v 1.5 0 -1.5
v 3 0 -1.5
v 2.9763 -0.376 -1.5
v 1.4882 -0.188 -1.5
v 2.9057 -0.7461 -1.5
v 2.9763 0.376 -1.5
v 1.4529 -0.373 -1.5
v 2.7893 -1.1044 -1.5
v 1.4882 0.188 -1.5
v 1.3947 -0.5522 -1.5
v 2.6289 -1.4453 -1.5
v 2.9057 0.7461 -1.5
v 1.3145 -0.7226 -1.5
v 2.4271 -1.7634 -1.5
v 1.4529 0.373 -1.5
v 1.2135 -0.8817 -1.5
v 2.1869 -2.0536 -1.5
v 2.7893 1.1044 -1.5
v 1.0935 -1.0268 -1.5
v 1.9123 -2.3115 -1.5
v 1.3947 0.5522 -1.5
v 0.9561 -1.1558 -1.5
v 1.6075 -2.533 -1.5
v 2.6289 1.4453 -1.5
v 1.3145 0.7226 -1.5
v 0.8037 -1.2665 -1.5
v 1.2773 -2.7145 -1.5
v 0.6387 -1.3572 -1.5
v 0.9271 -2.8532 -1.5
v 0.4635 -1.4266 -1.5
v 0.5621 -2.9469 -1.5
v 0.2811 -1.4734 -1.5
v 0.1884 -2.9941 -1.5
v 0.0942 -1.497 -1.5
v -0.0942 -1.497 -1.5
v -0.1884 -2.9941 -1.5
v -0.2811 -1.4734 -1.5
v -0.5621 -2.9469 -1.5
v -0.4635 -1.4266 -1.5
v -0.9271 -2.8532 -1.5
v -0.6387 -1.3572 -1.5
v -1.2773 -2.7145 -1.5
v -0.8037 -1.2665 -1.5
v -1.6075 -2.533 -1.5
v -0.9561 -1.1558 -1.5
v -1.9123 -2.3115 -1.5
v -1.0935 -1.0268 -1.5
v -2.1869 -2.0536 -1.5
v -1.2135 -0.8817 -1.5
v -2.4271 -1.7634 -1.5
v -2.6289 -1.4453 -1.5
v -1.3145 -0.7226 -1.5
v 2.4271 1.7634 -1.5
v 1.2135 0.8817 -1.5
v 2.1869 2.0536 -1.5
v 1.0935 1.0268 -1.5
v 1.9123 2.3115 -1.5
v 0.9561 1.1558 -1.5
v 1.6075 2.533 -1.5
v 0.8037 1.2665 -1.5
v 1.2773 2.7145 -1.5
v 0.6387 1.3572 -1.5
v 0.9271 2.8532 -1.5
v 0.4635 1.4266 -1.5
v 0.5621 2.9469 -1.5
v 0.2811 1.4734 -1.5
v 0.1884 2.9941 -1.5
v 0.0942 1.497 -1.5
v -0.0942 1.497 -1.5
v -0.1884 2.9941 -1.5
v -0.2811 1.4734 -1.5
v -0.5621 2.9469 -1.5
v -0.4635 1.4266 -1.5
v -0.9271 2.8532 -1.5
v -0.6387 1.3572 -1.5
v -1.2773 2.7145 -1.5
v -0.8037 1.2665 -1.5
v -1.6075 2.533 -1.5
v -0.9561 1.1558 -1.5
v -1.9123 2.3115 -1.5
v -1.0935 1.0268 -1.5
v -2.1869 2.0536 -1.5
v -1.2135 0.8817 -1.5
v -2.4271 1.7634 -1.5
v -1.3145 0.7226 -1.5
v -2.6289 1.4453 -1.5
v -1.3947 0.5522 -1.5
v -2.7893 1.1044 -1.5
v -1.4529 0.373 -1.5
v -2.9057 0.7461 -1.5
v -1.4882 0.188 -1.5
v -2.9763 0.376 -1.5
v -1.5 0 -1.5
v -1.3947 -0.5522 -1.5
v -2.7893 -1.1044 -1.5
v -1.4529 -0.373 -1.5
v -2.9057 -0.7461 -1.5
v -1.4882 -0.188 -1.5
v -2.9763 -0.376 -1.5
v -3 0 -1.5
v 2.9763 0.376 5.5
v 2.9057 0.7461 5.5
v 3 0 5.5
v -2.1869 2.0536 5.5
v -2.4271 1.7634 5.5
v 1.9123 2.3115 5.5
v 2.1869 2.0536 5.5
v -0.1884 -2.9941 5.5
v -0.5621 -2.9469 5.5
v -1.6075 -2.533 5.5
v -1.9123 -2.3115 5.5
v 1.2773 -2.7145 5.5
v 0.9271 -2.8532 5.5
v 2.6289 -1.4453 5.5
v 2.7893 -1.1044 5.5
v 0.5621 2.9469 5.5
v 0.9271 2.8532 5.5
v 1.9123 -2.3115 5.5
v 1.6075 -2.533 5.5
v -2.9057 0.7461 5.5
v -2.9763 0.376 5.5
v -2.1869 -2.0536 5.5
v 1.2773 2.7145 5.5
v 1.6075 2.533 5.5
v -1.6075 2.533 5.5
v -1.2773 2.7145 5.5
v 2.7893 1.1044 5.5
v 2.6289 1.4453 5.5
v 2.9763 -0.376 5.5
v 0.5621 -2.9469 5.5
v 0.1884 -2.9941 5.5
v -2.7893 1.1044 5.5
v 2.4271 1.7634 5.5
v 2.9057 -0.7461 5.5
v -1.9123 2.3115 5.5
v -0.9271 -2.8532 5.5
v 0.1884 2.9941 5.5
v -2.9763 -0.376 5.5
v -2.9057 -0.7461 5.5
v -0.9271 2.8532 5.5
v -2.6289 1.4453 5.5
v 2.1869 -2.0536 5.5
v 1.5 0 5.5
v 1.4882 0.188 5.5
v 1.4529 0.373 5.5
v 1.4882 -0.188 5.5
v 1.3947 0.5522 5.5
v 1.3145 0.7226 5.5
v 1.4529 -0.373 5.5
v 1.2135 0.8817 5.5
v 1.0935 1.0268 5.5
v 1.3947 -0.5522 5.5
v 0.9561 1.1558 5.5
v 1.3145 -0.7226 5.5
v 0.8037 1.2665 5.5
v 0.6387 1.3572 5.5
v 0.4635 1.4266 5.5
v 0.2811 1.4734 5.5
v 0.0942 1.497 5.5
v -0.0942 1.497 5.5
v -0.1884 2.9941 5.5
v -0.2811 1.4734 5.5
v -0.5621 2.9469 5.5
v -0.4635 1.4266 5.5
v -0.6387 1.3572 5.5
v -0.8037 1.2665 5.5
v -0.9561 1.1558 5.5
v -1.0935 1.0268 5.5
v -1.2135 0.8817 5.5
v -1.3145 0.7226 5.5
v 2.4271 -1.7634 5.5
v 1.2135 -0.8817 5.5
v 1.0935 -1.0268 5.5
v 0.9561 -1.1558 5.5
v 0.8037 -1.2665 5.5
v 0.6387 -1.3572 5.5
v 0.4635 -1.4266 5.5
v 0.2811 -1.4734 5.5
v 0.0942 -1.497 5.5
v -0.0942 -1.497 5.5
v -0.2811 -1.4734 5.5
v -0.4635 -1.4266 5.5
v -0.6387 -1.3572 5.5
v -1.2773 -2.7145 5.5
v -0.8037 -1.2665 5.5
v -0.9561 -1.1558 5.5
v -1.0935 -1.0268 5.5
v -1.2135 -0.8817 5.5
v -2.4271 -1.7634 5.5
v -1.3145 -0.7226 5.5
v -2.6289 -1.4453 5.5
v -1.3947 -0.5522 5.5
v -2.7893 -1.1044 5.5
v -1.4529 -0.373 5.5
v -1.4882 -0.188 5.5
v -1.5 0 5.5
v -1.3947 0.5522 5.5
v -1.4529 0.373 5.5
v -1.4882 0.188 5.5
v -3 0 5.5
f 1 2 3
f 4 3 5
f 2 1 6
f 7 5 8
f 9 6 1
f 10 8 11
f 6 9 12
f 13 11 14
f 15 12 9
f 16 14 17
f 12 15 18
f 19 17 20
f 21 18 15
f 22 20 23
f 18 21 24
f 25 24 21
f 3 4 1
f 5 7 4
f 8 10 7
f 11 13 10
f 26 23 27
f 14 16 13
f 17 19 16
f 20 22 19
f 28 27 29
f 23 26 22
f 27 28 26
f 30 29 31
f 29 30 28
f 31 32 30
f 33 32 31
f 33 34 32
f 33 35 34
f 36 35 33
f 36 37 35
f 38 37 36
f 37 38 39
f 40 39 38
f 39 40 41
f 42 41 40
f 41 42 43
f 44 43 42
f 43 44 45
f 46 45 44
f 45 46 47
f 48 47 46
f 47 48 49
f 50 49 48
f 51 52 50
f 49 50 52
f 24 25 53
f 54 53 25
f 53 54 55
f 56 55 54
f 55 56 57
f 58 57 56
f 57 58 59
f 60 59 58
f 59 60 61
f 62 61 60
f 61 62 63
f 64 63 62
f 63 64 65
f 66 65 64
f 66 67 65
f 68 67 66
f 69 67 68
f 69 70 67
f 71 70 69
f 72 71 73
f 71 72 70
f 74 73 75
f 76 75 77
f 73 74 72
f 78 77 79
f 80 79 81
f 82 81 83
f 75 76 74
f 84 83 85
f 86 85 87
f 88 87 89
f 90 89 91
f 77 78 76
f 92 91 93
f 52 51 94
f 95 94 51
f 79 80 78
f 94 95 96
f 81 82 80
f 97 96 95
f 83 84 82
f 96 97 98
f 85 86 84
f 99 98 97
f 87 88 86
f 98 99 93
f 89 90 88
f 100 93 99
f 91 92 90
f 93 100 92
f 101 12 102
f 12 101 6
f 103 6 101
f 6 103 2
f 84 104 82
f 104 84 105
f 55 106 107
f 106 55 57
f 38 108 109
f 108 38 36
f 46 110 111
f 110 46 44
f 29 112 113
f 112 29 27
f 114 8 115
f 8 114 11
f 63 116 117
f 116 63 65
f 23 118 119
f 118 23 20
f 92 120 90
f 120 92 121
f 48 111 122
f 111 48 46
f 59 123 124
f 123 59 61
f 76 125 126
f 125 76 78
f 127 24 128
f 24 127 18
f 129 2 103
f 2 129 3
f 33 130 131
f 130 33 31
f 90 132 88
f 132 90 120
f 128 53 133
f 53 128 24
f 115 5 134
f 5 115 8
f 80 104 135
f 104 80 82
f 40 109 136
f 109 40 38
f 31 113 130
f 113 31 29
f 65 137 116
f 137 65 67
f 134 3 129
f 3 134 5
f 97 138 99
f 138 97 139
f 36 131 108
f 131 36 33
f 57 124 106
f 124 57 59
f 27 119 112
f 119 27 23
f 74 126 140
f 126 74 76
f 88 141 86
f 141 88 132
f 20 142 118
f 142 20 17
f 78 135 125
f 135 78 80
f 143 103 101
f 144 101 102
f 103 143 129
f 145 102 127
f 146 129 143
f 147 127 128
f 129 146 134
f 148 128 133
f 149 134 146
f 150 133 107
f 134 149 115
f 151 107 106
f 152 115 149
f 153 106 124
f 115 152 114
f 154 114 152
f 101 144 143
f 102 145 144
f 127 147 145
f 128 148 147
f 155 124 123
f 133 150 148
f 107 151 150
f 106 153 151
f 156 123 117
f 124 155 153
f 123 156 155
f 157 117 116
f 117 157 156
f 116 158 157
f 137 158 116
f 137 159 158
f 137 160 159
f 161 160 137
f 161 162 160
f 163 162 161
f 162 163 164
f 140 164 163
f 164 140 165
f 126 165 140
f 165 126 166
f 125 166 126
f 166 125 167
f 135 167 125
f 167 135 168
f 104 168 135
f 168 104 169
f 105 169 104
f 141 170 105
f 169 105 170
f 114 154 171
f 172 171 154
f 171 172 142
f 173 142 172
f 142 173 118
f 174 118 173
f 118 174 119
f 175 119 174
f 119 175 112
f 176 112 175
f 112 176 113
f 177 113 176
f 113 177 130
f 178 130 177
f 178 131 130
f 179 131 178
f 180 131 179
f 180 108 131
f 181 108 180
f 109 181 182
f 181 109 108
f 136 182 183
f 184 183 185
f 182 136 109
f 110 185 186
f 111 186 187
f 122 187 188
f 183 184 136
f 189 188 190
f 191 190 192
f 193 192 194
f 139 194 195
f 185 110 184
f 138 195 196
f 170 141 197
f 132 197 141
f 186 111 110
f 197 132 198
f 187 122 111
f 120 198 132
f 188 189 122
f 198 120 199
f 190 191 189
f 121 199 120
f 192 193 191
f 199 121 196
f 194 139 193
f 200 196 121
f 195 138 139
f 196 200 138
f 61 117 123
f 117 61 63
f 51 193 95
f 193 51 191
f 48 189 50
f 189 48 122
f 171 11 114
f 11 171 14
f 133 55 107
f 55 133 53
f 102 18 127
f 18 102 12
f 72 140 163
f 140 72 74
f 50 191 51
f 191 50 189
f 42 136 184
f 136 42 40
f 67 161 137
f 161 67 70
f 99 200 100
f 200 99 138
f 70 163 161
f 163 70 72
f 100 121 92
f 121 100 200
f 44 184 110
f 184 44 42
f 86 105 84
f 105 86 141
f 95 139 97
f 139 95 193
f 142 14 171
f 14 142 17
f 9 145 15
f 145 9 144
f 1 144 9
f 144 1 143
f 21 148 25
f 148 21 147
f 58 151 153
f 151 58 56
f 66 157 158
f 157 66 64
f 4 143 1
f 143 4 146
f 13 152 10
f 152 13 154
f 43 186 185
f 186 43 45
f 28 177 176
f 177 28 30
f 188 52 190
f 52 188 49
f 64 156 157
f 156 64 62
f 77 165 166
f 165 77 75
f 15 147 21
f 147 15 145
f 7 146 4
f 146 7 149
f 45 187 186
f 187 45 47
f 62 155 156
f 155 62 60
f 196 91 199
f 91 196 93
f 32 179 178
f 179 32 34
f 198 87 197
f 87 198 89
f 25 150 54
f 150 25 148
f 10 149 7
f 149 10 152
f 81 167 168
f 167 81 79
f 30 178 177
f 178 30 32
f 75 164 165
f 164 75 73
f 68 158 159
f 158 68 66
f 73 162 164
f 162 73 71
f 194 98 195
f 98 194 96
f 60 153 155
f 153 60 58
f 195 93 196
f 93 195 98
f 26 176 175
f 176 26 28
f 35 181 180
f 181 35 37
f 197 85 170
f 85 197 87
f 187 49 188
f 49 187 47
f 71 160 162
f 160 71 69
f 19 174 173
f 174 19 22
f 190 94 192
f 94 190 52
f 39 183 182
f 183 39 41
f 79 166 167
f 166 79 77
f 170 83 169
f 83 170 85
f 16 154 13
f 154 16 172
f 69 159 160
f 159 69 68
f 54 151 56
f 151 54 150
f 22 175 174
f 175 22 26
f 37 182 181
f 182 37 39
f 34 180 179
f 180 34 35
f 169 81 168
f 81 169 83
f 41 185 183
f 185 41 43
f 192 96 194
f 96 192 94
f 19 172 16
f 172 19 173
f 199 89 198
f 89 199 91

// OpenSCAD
$fn = 50;


difference() {
	union() {
		translate(v = [0, 0, -1.5000000000]) {
			cylinder(h = 3, r = 1.0000000000);
		}
		translate(v = [0, 0, -1.5000000000]) {
			cylinder(h = 7, r = 3.0000000000);
		}
	}
	union() {
		translate(v = [0, 0, -100.0000000000]) {
			cylinder(h = 200, r = 1.5000000000);
		}
	}
}
